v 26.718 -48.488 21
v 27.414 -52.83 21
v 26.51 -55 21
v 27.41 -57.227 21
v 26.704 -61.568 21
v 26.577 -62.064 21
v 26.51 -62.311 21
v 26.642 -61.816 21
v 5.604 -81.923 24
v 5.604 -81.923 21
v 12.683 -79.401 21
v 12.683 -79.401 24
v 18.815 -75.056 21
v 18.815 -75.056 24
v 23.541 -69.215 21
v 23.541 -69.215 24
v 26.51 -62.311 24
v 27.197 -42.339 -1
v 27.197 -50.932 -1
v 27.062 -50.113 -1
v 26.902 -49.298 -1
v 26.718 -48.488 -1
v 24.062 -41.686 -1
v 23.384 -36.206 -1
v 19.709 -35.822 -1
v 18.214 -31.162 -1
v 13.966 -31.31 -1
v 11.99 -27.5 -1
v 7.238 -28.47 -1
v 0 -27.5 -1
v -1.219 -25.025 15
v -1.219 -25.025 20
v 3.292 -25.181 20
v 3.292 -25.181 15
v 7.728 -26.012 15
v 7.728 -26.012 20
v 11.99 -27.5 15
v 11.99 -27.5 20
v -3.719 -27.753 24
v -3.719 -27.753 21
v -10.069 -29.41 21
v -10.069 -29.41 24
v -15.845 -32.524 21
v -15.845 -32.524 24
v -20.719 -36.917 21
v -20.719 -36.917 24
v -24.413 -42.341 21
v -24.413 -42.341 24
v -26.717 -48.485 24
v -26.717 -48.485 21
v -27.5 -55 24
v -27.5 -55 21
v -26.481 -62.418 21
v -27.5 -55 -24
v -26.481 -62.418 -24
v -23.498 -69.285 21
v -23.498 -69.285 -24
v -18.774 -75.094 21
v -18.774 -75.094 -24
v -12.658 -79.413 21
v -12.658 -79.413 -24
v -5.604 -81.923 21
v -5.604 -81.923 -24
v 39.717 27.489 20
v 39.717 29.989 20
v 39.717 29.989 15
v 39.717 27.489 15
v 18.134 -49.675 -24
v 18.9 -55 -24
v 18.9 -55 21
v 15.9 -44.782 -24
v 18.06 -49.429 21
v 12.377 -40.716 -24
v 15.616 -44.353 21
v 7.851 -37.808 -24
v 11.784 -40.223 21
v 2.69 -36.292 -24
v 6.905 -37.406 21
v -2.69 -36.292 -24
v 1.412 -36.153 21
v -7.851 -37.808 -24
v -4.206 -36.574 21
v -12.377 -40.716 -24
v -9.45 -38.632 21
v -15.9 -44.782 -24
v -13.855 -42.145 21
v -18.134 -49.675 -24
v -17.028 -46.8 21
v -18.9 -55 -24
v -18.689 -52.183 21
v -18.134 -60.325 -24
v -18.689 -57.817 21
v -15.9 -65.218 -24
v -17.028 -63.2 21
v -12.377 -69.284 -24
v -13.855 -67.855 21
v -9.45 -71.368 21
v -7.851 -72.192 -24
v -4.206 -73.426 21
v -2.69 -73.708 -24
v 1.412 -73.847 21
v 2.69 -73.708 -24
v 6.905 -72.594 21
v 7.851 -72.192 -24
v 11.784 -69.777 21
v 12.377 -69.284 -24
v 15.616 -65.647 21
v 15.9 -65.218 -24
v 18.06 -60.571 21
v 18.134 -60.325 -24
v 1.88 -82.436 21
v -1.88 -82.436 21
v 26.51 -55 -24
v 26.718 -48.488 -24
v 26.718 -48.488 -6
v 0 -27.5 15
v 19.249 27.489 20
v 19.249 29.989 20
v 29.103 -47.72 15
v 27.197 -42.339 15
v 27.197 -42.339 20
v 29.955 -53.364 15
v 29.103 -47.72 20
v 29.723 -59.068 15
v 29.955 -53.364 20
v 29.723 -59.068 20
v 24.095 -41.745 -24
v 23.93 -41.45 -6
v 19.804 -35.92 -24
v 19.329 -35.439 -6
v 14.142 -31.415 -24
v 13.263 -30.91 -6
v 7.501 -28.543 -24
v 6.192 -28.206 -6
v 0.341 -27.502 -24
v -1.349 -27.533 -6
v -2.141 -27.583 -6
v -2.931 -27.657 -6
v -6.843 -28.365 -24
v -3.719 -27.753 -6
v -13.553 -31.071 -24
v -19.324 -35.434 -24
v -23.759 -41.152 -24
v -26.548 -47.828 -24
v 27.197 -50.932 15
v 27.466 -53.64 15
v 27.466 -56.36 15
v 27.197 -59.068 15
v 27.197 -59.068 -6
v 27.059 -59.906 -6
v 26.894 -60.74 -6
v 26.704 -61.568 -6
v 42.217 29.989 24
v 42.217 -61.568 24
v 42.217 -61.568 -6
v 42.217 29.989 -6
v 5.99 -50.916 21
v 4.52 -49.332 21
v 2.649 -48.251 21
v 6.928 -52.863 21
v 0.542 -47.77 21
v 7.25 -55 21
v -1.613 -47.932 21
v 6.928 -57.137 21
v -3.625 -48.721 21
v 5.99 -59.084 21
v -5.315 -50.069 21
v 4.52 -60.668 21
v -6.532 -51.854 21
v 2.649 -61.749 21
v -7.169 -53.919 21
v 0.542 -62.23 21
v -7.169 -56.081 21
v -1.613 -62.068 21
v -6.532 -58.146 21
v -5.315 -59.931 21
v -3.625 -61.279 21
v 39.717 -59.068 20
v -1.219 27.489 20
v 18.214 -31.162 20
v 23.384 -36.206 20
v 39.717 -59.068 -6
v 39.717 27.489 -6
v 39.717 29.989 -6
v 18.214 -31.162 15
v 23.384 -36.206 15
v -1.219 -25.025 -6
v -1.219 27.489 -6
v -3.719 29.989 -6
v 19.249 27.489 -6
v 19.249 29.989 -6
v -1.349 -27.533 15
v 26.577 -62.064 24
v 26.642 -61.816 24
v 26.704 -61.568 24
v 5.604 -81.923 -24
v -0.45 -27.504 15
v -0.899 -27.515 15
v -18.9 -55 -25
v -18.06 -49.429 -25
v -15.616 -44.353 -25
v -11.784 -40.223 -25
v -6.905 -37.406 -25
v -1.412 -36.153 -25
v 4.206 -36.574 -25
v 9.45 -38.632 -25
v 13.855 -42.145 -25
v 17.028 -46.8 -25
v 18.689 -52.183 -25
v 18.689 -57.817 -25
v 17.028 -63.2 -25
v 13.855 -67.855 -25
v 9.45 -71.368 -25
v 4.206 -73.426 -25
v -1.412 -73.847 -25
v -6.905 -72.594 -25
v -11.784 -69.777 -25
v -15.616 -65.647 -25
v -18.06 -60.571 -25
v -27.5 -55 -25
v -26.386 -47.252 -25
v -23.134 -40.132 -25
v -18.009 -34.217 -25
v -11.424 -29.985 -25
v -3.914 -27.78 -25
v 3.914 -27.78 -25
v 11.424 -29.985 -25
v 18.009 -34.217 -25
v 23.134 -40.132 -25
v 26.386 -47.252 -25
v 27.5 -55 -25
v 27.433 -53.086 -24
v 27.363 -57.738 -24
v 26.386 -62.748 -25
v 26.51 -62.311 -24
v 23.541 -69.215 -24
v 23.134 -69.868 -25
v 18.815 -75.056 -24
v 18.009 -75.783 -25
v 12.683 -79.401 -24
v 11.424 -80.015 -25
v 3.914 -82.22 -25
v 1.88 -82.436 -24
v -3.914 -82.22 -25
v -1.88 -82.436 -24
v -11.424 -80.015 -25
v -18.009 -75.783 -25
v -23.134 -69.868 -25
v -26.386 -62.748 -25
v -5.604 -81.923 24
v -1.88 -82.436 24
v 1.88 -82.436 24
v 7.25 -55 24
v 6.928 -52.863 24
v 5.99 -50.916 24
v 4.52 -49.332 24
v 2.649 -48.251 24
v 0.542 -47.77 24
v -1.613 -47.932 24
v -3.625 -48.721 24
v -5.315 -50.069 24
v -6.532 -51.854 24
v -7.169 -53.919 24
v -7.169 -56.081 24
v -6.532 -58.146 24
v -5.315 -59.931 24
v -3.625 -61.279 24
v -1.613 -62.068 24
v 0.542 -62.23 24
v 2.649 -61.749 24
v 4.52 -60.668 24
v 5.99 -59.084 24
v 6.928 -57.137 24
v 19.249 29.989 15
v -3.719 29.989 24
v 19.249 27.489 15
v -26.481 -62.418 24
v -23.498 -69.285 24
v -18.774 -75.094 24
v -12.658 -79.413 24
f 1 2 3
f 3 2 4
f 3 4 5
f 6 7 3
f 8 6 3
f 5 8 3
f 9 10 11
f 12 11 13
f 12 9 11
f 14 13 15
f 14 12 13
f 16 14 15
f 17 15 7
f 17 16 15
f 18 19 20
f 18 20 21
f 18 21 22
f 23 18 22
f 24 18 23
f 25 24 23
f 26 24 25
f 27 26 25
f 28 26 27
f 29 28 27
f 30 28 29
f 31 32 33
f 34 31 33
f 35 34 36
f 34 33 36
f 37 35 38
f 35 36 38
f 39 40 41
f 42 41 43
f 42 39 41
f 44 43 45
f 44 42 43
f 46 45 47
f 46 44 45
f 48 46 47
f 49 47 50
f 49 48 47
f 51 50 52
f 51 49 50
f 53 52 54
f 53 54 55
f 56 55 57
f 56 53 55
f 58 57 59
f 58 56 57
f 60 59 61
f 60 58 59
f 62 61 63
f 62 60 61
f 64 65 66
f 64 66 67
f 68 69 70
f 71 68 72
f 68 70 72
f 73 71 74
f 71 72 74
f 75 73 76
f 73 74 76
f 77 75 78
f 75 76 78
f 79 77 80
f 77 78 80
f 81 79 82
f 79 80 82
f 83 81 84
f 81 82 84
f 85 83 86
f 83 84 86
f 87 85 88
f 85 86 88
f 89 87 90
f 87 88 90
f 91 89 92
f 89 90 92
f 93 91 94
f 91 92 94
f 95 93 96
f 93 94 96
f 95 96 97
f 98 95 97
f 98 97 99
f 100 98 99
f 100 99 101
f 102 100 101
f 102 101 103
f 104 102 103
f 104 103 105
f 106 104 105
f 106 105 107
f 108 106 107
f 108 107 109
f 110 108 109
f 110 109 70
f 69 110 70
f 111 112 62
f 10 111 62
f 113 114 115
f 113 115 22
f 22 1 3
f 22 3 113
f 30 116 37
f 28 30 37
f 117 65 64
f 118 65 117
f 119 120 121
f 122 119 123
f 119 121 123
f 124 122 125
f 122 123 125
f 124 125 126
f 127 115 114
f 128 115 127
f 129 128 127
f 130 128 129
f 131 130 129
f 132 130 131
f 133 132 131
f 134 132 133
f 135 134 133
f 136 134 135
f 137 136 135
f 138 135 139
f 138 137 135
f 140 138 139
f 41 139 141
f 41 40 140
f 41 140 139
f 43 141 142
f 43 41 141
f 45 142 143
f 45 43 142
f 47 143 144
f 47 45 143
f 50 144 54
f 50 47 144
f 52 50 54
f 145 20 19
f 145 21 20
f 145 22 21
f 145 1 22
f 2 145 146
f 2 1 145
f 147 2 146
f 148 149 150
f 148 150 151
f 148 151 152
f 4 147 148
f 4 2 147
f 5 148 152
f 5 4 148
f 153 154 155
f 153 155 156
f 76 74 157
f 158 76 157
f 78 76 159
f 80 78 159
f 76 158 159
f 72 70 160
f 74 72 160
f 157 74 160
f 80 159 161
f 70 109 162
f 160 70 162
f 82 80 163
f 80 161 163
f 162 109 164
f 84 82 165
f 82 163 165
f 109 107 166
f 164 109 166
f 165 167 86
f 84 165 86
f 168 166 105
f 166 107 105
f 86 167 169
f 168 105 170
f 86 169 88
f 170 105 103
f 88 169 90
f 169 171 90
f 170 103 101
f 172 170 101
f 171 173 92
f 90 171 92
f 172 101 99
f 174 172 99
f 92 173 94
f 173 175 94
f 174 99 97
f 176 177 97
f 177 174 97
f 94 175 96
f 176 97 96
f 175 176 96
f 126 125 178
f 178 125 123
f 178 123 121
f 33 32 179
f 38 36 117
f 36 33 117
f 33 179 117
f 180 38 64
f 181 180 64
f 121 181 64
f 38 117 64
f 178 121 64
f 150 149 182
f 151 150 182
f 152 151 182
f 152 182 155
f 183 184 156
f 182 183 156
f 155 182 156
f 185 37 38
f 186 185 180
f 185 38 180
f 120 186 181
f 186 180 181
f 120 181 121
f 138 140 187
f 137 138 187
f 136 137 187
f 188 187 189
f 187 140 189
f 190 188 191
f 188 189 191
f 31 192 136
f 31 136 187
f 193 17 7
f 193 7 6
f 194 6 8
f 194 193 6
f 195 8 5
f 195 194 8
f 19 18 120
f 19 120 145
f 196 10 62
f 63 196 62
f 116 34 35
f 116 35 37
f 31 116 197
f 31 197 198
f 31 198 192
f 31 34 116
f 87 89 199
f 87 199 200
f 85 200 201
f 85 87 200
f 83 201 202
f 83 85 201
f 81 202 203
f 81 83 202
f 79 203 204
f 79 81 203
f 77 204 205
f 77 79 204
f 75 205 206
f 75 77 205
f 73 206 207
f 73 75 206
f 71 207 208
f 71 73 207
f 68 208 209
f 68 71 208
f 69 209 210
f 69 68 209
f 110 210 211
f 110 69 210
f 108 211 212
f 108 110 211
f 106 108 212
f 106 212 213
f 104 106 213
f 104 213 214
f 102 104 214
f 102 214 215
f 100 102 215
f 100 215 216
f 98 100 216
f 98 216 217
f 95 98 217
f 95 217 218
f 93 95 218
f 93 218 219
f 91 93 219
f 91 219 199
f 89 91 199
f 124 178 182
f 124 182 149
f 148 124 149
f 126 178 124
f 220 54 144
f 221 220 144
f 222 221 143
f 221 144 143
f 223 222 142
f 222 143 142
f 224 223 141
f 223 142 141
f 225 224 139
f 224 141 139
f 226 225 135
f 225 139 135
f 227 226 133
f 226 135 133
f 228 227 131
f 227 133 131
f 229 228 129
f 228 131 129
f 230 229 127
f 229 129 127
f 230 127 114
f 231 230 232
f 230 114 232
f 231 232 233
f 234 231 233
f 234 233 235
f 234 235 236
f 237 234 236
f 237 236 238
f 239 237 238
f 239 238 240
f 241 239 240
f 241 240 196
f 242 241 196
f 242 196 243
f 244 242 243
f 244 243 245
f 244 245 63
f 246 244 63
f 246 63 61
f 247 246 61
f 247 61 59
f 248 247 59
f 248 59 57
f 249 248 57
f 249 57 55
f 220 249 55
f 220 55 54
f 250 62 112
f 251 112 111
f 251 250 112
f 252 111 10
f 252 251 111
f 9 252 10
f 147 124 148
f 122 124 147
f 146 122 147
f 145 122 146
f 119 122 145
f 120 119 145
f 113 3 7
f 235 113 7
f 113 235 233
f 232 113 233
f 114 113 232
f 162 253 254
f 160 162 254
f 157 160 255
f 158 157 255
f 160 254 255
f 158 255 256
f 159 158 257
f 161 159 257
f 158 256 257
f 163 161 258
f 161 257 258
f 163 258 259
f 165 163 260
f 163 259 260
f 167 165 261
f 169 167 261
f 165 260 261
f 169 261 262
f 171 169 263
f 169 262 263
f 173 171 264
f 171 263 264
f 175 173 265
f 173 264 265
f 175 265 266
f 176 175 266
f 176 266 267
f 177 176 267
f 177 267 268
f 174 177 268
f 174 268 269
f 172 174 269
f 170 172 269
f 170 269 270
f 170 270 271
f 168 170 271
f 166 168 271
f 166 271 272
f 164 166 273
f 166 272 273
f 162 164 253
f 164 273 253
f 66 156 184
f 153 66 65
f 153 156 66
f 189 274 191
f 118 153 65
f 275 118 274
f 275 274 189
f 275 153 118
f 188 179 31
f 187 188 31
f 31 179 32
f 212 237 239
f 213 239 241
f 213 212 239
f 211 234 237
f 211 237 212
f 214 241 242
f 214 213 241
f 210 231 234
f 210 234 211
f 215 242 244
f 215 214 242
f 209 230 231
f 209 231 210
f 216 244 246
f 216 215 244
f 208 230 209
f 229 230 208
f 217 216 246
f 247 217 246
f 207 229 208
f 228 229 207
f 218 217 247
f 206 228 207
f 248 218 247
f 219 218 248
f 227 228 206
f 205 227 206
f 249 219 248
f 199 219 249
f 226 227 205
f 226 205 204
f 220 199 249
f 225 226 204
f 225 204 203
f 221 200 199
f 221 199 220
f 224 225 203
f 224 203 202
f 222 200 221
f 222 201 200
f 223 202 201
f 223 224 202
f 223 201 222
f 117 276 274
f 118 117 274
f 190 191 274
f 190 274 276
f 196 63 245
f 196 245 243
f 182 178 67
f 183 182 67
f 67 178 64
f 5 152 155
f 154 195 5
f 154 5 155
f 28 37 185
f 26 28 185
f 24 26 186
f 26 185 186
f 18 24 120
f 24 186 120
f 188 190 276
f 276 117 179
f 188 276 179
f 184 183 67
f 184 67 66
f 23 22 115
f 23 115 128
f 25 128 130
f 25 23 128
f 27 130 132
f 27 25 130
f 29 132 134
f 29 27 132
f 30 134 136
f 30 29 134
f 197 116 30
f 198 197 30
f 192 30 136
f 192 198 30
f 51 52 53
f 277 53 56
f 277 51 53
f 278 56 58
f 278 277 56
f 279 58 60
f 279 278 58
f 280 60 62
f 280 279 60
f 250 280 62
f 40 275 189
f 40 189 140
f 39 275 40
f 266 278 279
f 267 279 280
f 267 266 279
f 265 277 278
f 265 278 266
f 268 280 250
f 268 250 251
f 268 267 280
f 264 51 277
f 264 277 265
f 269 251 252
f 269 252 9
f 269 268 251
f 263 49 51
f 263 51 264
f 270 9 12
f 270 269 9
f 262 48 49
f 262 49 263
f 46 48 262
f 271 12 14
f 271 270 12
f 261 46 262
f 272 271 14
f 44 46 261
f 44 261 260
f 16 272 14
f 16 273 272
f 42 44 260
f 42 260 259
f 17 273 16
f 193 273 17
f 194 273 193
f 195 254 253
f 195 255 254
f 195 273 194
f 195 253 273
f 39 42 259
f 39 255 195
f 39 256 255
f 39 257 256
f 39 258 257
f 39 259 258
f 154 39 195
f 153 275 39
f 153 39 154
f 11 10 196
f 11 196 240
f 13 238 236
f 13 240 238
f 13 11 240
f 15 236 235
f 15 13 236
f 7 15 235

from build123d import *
from build123d.topology import SkipClean

# Parameters (mm, degrees)
BOSS_EXTRUDE1_DEPTH     = 24
CUT_EXTRUDE1_DEPTH      = 91.21363533302491
CUT_EXTRUDE1_DEPTH_BACK = 91.21363533302491
SKETCH2_4_R             = 16.25
CUT_EXTRUDE2_DEPTH      = 3
CUT_EXTRUDE2_DEPTH_BACK = 48
SKETCH2_5_R             = 19.5
SKETCH2_5_R_2           = 16.25
CUT_EXTRUDE3_DEPTH      = 48
CUT_EXTRUDE3_DEPTH_BACK = 16
SKETCH3_W               = 8.5
SKETCH3_H               = 14.200000000000006
CUT_EXTRUDE4_DEPTH      = 40
SKETCH7_R               = 27.499999999999996
SKETCH7_R_2             = 18.9
BOSS_EXTRUDE2_DEPTH     = 1
SKETCH8_W               = 181.3602376825947
SKETCH8_H               = 155.21218123297842
CUT_EXTRUDE5_DEPTH      = 48
BOSS_EXTRUDE3_START     = 48
SKETCH9_R               = 27.499999999999996
SKETCH9_R_2             = 18.9
BOSS_EXTRUDE3_DEPTH     = 48
CUT_EXTRUDE6_DEPTH      = 48
BOSS_EXTRUDE4_DEPTH     = 4
EXTRUDE_THIN2_DEPTH     = 30
CUT_EXTRUDE8_START      = -21
CUT_EXTRUDE8_DEPTH      = 21
BOSS_EXTRUDE5_DEPTH     = 21
CUT_EXTRUDE9_DEPTH      = 21
CUT_EXTRUDE10_DEPTH     = 5
SKETCH21_R              = 27.499999999999996
SKETCH21_R_2            = 7.25
BOSS_EXTRUDE6_DEPTH     = 3


with BuildPart() as part:
    # Sketch2 → Boss-Extrude1 (new, symmetric)
    with BuildSketch(Plane.XY):
        with BuildLine():
            ThreePointArc((-24.69493875270801, -42.900000000000006), (1.68e-15, -82.5), (24.694938752708016, -42.9))
            ThreePointArc((24.694938752708016, -42.9), (21.124860801609124, -27.49999999999999), (24.694938752708012, -12.099999999999996))
            ThreePointArc((24.694938752708012, -12.099999999999996), (3.42e-15, 27.499999999999996), (-24.694938752708012, -12.100000000000001))
            ThreePointArc((-24.694938752708012, -12.100000000000001), (-21.124860801609117, -27.500000000000004), (-24.69493875270801, -42.900000000000006))
        make_face()
    extrude(amount=BOSS_EXTRUDE1_DEPTH, both=True)

    # Sketch2<4> → Cut-Extrude1 (cut, two sides: drawn at the far end of the back side and taken through both)
    with BuildSketch(Plane.XY.offset(-CUT_EXTRUDE1_DEPTH_BACK)):
        with Locations((6.74e-15, -55)):
            Circle(SKETCH2_4_R)
    extrude(amount=CUT_EXTRUDE1_DEPTH + CUT_EXTRUDE1_DEPTH_BACK, mode=Mode.SUBTRACT)

    # Sketch2<5> → Cut-Extrude2 (cut, two sides: drawn at the far end of the back side and taken through both)
    with BuildSketch(Plane.XY.offset(-CUT_EXTRUDE2_DEPTH_BACK)):
        with Locations((6.74e-15, -55)):
            Circle(SKETCH2_5_R)
        with Locations((6.74e-15, -55)):
            Circle(SKETCH2_5_R_2, mode=Mode.SUBTRACT)
    extrude(amount=CUT_EXTRUDE2_DEPTH + CUT_EXTRUDE2_DEPTH_BACK, mode=Mode.SUBTRACT)

    # Sketch2<6> → Cut-Extrude3 (cut, two sides: drawn at the far end of the back side and taken through both)
    with BuildSketch(Plane.XY.offset(-CUT_EXTRUDE3_DEPTH_BACK)):
        Polygon((10.399999999999997, 20.400000000000002), (-10.400000000000002, 20.400000000000002), (-10.399999999999999, -20.399999999999995), (10.400000000000002, -20.399999999999995), align=None)
    extrude(amount=CUT_EXTRUDE3_DEPTH + CUT_EXTRUDE3_DEPTH_BACK, mode=Mode.SUBTRACT)

    # Sketch3 → Cut-Extrude4 (cut)
    with BuildSketch(Plane.XY.offset(24)):
        with Locations((0, 27.500000000000007)):
            Rectangle(SKETCH3_W, SKETCH3_H)
    extrude(amount=-CUT_EXTRUDE4_DEPTH, mode=Mode.SUBTRACT)

    # Sketch7 → Boss-Extrude2 (add)
    with BuildSketch(Plane(origin=(0, 0, -24), x_dir=(-1, 0, 0), z_dir=(0, 0, -1))):
        with Locations((-6.74e-15, -55)):
            Circle(SKETCH7_R)
        with Locations((-6.74e-15, -55)):
            Circle(SKETCH7_R_2, mode=Mode.SUBTRACT)
    extrude(amount=BOSS_EXTRUDE2_DEPTH)

    # Sketch8 → Cut-Extrude5 (cut)
    with BuildSketch(Plane.XY.offset(24)):
        with Locations((-25.06580059332441, -26.494305521168478)):
            Rectangle(SKETCH8_W, SKETCH8_H)
    extrude(amount=-CUT_EXTRUDE5_DEPTH, mode=Mode.SUBTRACT)

    # Sketch9 → Boss-Extrude3 (add)
    with SkipClean():  # the faces are left unmerged after this step: merging them gives an invalid solid
        with BuildSketch(Plane.XY.offset(-24).offset(BOSS_EXTRUDE3_START)):
            with Locations(Location((6.74e-15, -55, 0), (0, 0, 180))):
                Circle(SKETCH9_R)
            with Locations((6.74e-15, -55)):
                Circle(SKETCH9_R_2, mode=Mode.SUBTRACT)
        extrude(amount=-BOSS_EXTRUDE3_DEPTH)

    # Sketch10 → Cut-Extrude6 (cut)
    with SkipClean():  # the faces are left unmerged after this step: merging them gives an invalid solid
        with BuildSketch(Plane.XY.offset(24)):
            with BuildLine():
                Line((26.717930940571712, -48.48830542371335), (26.510281823927063, -55))
                Line((26.510281823927063, -55), (26.510281823927063, -62.311289736835946))
                ThreePointArc((26.51028182392707, -62.311289736835946), (27.25144721072622, -58.68898697761363), (27.500000000000014, -55))
                ThreePointArc((27.500000000000014, -55), (27.30378271289276, -51.72075472598662), (26.717930940571723, -48.48830542371334))
            make_face()
            with BuildLine():
                ThreePointArc((-5.604082705298323, -81.92293180603063), (6e-15, -82.5), (5.604082705298339, -81.92293180603063))
                Line((5.604082705298337, -81.92293180603063), (6.74e-15, -81.92293180603063))
                Line((7.11e-15, -81.92293180603063), (-5.604082705298323, -81.92293180603063))
            make_face()
        extrude(amount=-CUT_EXTRUDE6_DEPTH, mode=Mode.SUBTRACT)

    # Sketch11 → Boss-Extrude4 (add)
    with SkipClean():  # the faces are left unmerged after this step: merging them gives an invalid solid
        with BuildSketch(Plane.XY.offset(24)):
            with BuildLine():
                ThreePointArc((27.500000000000025, -55.00000000000003), (27.300326018506244, -58.3078995273848), (26.7042036884893, -61.56776258429582))
                Line((26.70420368848926, -61.56776258429563), (42.21724684134985, -61.56776258429563))
                Line((42.21724684134985, -61.56776258429563), (42.21724684134985, 29.98869686217629))
                Line((42.21724684134985, 29.988696862176287), (-3.7193423220770256, 29.988696862176287))
                Line((-3.719342322077025, 29.988696862176287), (-3.719342322077025, -27.7526791648939))
                ThreePointArc((-3.719342322077028, -27.7526791648939), (15.483065545848751, -32.27282064789051), (26.717930940571723, -48.488305423713314))
                ThreePointArc((26.717930940571723, -48.488305423713314), (27.303782712892772, -51.72075472598662), (27.500000000000025, -55.00000000000002))
            make_face()
        extrude(amount=-BOSS_EXTRUDE4_DEPTH)

    # Sketch16 → Extrude-Thin2 (add)
    with SkipClean():  # the faces are left unmerged after this step: merging them gives an invalid solid
        with BuildSketch(Plane(origin=(0, 0, 24), x_dir=(-1, 0, 0), z_dir=(0, 0, -1))):
            with BuildLine():
                Line((-26.704203688489347, -61.56776258429563), (-42.21724684134985, -61.56776258429563))
                Line((-42.21724684134985, -61.56776258429563), (-42.21724684134985, 29.988696862176287))
                Line((-42.21724684134985, 29.988696862176287), (3.719342322077025, 29.988696862176287))
                Line((3.719342322077025, 29.988696862176287), (3.719342322077025, -27.75267916489391))
                ThreePointArc((3.719342322077025, -27.75267916489391), (-20.443603637167037, -36.60682000505511), (-26.704203688489347, -61.56776258429563))
            make_face()
            with BuildLine():
                Line((-29.722942444479006, -59.06776258429563), (-39.71724684134985, -59.06776258429563))
                Line((-39.71724684134985, -59.06776258429563), (-39.71724684134985, 27.48869686217629))
                Line((-39.71724684134985, 27.48869686217629), (1.2193423220770256, 27.488696862176287))
                Line((1.2193423220770256, 27.488696862176287), (1.2193423220770252, -25.02479017084956))
                ThreePointArc((1.2193423220770252, -25.02479017084956), (-22.200108055370485, -34.82191281786335), (-29.722942444479006, -59.06776258429563))
            make_face(mode=Mode.SUBTRACT)
        extrude(amount=EXTRUDE_THIN2_DEPTH)

    # Sketch17 → Cut-Extrude8 (cut)
    with BuildSketch(Plane(origin=(0, 0, -5.999999999999998), x_dir=(-1, 0, 0), z_dir=(0, 0, -1)).offset(CUT_EXTRUDE8_START)):
        with BuildLine():
            Line((1.3487027041970006, -27.53309262010562), (1.2193423220770252, -25.02479017084956))
            ThreePointArc((1.2193423220770252, -25.02479017084956), (-22.20010805537015, -34.82191281786366), (-29.72294244447902, -59.06776258429561))
            Line((-29.72294244447902, -59.06776258429561), (-27.19748715520997, -59.06776258429561))
            ThreePointArc((-27.19748715520997, -59.06776258429561), (-20.38746592483553, -36.54461506324843), (1.3487027041970006, -27.53309262010562))
        make_face()
    extrude(amount=CUT_EXTRUDE8_DEPTH, mode=Mode.SUBTRACT)

    # Sketch18 → Boss-Extrude5 (add)
    with BuildSketch(Plane(origin=(0, 0, 20), x_dir=(-1, 0, 0), z_dir=(0, 0, -1))):
        with BuildLine():
            ThreePointArc((-27.19748715520984, -50.93223741570337), (-17.949742740939968, -34.16597169210712), (-1.0275e-13, -27.499999999999904))
            Line((-1.0275e-13, -27.499999999999908), (-11.98957880828152, -27.499999999999908))
            ThreePointArc((-11.98957880828161, -27.49999999999943), (-20.951294804022364, -33.528082385707165), (-27.197487155209934, -42.33916699256241))
            Line((-27.197487155209956, -42.339166992562404), (-27.197487155209956, -50.93223741570336))
        make_face()
    extrude(amount=BOSS_EXTRUDE5_DEPTH)

    # Sketch19 → Cut-Extrude9 (cut)
    with BuildSketch(Plane(origin=(0, 0, -5.999999999999998), x_dir=(-1, 0, 0), z_dir=(0, 0, -1))):
        Polygon((-39.71724684134985, 27.48869686217629), (-39.71724684134984, 29.988696862176287), (-19.248952259636408, 29.988696862176287), (-19.24895225963641, 27.48869686217629), align=None)
    extrude(amount=-CUT_EXTRUDE9_DEPTH, mode=Mode.SUBTRACT)

    # Sketch20 → Cut-Extrude10 (cut)
    with BuildSketch(Plane(origin=(0, 0, 15.000000000000004), x_dir=(-1, 0, 0), z_dir=(0, 0, -1))):
        Polygon((-19.248952259636408, 29.988696862176287), (-39.71724684134984, 29.988696862176287), (-39.71724684134984, 27.48869686217629), (-19.24895225963641, 27.48869686217629), align=None)
    extrude(amount=-CUT_EXTRUDE10_DEPTH, mode=Mode.SUBTRACT)

    # Sketch21 → Boss-Extrude6 (add)
    with BuildSketch(Plane.XY.offset(24)):
        with Locations(Location((6.74e-15, -55, 0), (0, 0, 180))):
            Circle(SKETCH21_R)
        with Locations((6.74e-15, -55)):
            Circle(SKETCH21_R_2, mode=Mode.SUBTRACT)
    extrude(amount=-BOSS_EXTRUDE6_DEPTH)


solid = part.part
